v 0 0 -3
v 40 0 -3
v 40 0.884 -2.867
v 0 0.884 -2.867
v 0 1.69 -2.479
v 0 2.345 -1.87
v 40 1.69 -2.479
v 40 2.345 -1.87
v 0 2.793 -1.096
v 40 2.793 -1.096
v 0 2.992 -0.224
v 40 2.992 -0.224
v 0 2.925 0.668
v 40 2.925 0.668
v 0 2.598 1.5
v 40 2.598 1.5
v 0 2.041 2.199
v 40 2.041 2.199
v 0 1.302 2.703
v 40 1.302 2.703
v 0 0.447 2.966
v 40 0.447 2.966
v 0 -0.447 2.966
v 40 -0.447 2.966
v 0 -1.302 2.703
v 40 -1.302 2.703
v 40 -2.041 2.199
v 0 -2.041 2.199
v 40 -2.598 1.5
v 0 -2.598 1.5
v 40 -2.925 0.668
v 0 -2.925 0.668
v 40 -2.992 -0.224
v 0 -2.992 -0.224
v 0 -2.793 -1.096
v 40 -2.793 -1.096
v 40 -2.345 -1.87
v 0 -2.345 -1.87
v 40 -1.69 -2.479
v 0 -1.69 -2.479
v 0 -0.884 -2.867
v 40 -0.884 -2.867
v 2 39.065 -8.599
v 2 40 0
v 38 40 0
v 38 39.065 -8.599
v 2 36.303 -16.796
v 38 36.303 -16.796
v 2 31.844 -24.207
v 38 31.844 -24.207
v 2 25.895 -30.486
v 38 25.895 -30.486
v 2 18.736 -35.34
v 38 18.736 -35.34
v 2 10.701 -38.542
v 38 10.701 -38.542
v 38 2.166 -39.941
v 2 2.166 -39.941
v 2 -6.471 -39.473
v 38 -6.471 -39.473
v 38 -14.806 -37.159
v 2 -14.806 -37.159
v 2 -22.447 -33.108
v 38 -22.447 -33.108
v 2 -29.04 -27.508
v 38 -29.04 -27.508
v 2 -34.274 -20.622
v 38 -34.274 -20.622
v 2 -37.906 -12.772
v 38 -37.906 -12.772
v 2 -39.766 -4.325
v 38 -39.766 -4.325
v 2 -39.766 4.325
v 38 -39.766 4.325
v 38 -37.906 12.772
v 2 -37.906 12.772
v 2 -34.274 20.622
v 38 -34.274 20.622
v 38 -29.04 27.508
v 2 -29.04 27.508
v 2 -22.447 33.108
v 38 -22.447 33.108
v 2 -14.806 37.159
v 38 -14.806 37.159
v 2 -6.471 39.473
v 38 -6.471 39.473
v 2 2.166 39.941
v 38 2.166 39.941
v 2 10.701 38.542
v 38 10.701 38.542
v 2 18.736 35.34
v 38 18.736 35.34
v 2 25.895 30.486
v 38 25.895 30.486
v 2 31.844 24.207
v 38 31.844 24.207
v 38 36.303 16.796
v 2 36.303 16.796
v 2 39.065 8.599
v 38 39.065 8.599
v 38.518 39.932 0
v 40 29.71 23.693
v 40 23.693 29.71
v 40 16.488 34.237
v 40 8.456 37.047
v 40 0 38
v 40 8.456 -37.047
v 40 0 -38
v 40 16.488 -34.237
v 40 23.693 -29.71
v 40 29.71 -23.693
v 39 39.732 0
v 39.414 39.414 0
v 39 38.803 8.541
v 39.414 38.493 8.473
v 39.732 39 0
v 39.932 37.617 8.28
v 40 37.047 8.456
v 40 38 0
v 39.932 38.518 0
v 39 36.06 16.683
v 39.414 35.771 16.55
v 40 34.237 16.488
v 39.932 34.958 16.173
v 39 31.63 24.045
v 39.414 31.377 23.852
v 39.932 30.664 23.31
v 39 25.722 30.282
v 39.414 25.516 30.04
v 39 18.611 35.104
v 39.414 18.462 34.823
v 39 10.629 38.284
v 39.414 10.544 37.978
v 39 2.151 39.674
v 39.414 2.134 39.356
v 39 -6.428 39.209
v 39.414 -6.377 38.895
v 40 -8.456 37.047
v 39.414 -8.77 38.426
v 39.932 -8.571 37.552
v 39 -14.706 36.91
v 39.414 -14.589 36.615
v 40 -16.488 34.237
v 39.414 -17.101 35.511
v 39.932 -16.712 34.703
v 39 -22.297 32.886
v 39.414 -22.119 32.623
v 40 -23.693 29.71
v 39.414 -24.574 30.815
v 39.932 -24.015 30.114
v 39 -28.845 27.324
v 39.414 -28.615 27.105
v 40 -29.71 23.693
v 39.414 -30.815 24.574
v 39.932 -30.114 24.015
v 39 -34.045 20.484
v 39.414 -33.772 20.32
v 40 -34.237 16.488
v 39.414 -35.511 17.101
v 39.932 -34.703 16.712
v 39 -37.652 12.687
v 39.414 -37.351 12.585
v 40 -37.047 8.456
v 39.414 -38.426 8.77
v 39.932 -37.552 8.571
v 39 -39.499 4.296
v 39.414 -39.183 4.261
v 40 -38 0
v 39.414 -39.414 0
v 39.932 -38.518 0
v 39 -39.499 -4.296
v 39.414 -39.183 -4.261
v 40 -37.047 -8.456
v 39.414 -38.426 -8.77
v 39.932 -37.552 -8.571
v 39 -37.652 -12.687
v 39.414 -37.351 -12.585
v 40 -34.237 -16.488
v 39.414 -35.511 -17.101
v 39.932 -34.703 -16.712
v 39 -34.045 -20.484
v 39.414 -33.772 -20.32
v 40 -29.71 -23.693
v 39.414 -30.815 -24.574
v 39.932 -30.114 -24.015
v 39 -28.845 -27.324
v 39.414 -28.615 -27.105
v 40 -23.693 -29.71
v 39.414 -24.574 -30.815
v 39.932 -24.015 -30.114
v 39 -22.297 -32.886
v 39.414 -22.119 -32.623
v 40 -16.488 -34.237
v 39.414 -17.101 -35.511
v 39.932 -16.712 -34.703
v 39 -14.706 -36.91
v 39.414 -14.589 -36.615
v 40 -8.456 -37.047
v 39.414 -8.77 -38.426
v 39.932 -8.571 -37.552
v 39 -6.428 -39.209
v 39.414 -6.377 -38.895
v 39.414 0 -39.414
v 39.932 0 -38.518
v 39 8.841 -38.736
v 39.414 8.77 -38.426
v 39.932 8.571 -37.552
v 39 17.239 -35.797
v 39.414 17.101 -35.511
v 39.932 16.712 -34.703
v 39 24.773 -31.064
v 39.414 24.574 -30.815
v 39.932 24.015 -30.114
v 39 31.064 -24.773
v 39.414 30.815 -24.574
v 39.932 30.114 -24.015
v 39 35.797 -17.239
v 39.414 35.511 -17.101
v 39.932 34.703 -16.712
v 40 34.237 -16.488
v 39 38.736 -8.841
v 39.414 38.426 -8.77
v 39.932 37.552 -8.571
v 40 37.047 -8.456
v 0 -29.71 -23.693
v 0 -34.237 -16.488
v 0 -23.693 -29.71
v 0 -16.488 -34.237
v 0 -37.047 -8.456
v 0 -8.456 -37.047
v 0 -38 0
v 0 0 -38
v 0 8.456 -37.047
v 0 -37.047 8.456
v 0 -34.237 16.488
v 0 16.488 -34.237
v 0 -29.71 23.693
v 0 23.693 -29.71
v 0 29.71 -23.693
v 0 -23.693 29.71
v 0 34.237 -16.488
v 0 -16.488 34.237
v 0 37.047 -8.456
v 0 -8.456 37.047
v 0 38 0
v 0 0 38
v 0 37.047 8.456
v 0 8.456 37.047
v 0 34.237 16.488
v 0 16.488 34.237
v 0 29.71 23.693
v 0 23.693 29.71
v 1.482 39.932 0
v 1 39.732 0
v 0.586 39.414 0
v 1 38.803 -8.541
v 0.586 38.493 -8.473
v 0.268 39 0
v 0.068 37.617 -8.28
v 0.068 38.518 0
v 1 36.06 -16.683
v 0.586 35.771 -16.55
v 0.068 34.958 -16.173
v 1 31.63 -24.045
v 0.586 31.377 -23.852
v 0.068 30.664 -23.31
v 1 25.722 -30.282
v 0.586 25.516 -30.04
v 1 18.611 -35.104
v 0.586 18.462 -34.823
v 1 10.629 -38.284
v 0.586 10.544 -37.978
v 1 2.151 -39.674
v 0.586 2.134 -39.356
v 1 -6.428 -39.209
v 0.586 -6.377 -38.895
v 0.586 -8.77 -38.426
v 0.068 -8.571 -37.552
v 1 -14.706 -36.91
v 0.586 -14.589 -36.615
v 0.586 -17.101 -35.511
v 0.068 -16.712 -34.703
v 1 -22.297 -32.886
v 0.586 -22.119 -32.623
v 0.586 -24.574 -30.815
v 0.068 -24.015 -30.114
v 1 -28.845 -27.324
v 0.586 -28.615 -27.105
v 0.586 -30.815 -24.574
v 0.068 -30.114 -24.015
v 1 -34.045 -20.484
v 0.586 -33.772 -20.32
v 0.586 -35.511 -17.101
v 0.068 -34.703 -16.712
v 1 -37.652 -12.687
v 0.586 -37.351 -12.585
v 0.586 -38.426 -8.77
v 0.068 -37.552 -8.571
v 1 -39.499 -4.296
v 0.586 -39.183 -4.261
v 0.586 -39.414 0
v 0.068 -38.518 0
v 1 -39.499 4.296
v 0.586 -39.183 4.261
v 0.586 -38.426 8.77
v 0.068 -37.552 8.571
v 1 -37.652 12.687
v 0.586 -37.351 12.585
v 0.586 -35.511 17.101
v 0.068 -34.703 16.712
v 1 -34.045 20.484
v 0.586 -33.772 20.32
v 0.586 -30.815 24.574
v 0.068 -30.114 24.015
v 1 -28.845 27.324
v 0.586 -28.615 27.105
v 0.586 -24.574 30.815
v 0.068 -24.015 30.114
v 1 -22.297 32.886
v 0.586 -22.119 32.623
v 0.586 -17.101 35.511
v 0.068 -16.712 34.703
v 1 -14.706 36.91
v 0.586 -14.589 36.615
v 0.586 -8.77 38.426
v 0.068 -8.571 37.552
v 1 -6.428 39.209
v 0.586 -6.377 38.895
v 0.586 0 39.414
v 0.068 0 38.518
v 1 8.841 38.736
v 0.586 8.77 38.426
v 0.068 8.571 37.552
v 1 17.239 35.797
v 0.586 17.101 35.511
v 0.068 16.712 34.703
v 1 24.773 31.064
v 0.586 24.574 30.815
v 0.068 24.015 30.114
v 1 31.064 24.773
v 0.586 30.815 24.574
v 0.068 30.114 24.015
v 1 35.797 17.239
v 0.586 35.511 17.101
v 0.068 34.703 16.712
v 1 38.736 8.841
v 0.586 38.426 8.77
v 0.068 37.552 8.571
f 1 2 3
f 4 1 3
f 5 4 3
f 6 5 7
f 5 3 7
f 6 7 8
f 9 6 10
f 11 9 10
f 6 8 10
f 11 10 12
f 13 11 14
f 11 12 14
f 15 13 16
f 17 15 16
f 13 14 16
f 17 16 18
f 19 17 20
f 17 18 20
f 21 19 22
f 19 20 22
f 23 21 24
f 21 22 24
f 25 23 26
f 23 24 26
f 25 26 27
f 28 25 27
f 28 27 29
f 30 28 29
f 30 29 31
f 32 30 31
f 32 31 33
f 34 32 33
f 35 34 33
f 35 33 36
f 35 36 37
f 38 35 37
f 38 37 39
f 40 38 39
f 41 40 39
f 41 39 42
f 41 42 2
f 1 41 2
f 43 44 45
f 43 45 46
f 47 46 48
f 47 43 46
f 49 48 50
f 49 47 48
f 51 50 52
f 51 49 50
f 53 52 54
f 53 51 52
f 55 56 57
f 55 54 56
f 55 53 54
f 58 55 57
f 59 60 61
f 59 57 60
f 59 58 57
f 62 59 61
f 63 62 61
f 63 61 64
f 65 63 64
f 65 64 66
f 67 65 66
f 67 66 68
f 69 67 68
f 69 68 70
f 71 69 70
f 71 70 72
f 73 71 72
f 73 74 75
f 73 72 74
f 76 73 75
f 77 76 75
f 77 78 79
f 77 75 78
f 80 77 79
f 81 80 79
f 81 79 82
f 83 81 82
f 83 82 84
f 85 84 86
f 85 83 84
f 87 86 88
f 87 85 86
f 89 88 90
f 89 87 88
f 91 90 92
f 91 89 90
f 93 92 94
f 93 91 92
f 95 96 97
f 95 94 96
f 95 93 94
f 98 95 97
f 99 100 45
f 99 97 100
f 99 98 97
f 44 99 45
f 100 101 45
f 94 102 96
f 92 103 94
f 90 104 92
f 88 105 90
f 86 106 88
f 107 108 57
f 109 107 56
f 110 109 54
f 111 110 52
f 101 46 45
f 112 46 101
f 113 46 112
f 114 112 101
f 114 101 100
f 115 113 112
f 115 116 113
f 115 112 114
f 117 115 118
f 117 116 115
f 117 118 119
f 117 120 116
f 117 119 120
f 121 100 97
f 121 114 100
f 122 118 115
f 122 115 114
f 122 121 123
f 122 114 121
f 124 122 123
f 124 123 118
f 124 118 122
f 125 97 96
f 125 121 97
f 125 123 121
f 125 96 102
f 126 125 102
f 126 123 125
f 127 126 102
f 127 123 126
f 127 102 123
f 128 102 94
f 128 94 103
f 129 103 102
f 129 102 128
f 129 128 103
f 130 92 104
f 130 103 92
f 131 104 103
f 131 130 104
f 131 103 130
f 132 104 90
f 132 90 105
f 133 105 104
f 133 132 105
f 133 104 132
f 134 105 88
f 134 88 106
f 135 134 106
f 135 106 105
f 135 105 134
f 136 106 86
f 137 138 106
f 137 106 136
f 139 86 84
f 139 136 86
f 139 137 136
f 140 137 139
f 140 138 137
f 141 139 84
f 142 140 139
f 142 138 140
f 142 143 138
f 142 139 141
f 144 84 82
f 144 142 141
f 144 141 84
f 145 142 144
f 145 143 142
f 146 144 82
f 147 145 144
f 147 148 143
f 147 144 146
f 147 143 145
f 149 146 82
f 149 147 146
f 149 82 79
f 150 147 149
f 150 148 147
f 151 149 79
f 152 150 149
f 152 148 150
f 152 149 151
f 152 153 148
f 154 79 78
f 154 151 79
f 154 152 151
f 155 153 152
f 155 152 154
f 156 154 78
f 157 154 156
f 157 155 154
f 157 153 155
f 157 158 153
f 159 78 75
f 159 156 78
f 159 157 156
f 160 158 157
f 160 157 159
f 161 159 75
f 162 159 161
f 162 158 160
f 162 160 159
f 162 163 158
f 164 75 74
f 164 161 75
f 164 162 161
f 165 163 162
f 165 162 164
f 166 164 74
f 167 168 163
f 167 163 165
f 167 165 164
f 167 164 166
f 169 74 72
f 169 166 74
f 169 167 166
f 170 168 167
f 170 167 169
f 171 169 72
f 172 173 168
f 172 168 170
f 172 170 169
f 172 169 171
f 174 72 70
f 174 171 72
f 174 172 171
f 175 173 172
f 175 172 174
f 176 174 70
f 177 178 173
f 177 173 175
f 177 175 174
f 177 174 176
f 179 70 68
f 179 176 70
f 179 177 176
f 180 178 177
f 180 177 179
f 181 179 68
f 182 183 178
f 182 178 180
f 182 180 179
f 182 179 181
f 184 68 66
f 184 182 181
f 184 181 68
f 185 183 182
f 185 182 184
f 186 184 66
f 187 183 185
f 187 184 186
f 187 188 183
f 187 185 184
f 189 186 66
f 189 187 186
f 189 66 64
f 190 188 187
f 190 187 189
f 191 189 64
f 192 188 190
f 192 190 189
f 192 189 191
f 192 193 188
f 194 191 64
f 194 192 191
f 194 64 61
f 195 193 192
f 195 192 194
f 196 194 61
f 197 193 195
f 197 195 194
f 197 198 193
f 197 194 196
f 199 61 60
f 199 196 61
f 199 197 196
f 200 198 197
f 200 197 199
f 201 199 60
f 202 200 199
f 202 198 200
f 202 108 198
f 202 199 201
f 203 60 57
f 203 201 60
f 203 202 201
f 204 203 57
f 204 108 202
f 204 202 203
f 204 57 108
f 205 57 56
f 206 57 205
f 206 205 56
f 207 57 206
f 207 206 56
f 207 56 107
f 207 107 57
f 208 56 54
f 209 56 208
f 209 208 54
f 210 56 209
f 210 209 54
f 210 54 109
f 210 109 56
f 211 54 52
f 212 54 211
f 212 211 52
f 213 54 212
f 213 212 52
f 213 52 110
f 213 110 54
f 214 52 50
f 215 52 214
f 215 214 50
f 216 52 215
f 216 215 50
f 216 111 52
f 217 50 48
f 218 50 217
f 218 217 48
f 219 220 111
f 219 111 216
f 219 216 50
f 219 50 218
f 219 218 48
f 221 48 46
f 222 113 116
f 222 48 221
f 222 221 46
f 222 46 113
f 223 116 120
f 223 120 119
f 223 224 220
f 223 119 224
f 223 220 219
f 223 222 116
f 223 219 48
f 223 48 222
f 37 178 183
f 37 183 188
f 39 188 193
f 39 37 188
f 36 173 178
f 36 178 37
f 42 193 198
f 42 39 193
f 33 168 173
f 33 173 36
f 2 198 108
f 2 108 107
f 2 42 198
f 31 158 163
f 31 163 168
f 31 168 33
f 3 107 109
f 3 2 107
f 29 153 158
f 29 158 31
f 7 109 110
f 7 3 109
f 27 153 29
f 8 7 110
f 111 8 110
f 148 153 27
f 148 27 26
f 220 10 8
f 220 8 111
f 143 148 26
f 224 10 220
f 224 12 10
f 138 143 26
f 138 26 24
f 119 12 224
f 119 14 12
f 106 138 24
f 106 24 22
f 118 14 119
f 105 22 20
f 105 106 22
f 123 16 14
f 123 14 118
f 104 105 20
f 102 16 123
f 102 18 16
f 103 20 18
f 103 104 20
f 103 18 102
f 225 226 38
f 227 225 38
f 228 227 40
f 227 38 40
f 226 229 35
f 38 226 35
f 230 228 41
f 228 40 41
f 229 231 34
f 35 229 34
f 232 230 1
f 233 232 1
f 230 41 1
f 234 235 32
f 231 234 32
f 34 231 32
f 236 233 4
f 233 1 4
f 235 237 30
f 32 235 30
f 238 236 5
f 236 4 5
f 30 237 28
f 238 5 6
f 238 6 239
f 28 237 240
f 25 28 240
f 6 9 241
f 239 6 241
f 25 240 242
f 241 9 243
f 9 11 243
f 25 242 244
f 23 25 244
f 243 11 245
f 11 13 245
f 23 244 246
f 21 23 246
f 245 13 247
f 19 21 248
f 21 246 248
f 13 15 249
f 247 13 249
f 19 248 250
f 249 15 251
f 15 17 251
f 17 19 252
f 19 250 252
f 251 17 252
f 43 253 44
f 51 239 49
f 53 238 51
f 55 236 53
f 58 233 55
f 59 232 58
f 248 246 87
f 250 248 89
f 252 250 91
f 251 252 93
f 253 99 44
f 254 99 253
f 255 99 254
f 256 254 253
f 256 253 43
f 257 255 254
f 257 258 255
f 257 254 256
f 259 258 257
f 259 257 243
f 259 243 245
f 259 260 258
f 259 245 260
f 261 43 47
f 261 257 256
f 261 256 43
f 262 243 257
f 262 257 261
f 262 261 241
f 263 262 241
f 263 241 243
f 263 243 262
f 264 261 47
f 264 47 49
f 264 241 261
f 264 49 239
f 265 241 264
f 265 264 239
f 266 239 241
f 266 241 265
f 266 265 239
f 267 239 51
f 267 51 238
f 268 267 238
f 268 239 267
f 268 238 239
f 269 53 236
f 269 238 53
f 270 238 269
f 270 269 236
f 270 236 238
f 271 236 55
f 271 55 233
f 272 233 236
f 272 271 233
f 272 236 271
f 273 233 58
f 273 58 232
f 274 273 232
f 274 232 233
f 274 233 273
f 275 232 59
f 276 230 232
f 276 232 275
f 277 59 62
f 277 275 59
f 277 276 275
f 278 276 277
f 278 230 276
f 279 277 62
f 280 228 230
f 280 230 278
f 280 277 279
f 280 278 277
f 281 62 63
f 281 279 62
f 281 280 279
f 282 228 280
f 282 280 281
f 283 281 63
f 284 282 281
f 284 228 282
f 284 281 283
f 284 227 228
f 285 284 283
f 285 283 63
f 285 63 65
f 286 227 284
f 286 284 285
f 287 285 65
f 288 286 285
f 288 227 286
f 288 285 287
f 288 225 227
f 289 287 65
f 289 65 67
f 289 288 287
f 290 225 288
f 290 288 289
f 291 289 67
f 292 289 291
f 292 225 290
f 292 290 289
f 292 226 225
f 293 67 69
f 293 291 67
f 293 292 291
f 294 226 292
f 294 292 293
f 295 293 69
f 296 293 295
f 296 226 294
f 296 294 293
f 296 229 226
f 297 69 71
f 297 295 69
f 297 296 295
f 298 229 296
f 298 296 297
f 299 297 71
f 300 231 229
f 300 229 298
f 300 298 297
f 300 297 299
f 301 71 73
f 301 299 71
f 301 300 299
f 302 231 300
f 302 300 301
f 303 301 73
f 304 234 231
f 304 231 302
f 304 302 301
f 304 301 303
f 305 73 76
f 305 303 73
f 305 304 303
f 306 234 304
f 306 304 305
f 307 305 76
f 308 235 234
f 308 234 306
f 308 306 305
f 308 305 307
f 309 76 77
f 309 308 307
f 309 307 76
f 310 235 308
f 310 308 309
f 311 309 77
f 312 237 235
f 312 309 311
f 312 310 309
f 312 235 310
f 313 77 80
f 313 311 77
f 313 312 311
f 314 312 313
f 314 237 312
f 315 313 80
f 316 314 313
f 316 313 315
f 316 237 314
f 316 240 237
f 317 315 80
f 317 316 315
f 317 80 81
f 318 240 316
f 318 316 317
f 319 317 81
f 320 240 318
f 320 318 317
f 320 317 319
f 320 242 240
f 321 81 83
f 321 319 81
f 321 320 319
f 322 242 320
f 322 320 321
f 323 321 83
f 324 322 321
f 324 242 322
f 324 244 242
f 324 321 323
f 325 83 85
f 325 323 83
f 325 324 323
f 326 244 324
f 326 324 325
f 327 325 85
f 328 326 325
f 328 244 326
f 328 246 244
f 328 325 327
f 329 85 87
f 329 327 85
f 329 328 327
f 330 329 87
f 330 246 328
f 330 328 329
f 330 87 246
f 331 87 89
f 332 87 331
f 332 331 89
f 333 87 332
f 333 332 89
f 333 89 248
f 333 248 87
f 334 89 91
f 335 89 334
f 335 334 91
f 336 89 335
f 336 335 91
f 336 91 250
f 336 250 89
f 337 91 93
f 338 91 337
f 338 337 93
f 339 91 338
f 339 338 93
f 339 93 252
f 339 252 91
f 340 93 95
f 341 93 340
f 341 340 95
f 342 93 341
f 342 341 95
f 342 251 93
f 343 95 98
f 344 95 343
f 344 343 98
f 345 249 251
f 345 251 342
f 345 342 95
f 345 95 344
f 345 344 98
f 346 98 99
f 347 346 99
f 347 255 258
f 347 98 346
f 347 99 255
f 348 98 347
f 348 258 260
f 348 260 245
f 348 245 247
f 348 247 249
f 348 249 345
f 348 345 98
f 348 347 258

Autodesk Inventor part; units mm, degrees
ref_plane "YZ Plane" through (0, 0, 0) normal (1, 0, 0) x (0, 1, 0)
ref_plane "XZ Plane" through (0, 0, 0) normal (0, 1, 0) x (-1, 0, 0)
ref_plane "XY Plane" through (0, 0, 0) normal (0, 0, 1) x (1, 0, 0)
sketch "草图1" plane through (0, 0, 0) normal (1, 0, 0) x (0, 1, 0)
  circle A0 centre (0, 0) radius 40
  dimension "d0" = 80
extrude "拉伸1" add sketch "草图1" along normal blind 40
sketch "草图2" plane through (40, 0, 0) normal (1, 0, 0) x (0, 0, -1)
  circle A0 centre (0, 0) radius 3
  dimension "d3" = 6
extrude "拉伸2" cut sketch "草图2" against normal through all
fillet "圆角1" radius 2 1 edges at (0, -40, 0)
fillet "圆角2" radius 2 1 edges at (40, -40, 0)
properties part number "轮子"
